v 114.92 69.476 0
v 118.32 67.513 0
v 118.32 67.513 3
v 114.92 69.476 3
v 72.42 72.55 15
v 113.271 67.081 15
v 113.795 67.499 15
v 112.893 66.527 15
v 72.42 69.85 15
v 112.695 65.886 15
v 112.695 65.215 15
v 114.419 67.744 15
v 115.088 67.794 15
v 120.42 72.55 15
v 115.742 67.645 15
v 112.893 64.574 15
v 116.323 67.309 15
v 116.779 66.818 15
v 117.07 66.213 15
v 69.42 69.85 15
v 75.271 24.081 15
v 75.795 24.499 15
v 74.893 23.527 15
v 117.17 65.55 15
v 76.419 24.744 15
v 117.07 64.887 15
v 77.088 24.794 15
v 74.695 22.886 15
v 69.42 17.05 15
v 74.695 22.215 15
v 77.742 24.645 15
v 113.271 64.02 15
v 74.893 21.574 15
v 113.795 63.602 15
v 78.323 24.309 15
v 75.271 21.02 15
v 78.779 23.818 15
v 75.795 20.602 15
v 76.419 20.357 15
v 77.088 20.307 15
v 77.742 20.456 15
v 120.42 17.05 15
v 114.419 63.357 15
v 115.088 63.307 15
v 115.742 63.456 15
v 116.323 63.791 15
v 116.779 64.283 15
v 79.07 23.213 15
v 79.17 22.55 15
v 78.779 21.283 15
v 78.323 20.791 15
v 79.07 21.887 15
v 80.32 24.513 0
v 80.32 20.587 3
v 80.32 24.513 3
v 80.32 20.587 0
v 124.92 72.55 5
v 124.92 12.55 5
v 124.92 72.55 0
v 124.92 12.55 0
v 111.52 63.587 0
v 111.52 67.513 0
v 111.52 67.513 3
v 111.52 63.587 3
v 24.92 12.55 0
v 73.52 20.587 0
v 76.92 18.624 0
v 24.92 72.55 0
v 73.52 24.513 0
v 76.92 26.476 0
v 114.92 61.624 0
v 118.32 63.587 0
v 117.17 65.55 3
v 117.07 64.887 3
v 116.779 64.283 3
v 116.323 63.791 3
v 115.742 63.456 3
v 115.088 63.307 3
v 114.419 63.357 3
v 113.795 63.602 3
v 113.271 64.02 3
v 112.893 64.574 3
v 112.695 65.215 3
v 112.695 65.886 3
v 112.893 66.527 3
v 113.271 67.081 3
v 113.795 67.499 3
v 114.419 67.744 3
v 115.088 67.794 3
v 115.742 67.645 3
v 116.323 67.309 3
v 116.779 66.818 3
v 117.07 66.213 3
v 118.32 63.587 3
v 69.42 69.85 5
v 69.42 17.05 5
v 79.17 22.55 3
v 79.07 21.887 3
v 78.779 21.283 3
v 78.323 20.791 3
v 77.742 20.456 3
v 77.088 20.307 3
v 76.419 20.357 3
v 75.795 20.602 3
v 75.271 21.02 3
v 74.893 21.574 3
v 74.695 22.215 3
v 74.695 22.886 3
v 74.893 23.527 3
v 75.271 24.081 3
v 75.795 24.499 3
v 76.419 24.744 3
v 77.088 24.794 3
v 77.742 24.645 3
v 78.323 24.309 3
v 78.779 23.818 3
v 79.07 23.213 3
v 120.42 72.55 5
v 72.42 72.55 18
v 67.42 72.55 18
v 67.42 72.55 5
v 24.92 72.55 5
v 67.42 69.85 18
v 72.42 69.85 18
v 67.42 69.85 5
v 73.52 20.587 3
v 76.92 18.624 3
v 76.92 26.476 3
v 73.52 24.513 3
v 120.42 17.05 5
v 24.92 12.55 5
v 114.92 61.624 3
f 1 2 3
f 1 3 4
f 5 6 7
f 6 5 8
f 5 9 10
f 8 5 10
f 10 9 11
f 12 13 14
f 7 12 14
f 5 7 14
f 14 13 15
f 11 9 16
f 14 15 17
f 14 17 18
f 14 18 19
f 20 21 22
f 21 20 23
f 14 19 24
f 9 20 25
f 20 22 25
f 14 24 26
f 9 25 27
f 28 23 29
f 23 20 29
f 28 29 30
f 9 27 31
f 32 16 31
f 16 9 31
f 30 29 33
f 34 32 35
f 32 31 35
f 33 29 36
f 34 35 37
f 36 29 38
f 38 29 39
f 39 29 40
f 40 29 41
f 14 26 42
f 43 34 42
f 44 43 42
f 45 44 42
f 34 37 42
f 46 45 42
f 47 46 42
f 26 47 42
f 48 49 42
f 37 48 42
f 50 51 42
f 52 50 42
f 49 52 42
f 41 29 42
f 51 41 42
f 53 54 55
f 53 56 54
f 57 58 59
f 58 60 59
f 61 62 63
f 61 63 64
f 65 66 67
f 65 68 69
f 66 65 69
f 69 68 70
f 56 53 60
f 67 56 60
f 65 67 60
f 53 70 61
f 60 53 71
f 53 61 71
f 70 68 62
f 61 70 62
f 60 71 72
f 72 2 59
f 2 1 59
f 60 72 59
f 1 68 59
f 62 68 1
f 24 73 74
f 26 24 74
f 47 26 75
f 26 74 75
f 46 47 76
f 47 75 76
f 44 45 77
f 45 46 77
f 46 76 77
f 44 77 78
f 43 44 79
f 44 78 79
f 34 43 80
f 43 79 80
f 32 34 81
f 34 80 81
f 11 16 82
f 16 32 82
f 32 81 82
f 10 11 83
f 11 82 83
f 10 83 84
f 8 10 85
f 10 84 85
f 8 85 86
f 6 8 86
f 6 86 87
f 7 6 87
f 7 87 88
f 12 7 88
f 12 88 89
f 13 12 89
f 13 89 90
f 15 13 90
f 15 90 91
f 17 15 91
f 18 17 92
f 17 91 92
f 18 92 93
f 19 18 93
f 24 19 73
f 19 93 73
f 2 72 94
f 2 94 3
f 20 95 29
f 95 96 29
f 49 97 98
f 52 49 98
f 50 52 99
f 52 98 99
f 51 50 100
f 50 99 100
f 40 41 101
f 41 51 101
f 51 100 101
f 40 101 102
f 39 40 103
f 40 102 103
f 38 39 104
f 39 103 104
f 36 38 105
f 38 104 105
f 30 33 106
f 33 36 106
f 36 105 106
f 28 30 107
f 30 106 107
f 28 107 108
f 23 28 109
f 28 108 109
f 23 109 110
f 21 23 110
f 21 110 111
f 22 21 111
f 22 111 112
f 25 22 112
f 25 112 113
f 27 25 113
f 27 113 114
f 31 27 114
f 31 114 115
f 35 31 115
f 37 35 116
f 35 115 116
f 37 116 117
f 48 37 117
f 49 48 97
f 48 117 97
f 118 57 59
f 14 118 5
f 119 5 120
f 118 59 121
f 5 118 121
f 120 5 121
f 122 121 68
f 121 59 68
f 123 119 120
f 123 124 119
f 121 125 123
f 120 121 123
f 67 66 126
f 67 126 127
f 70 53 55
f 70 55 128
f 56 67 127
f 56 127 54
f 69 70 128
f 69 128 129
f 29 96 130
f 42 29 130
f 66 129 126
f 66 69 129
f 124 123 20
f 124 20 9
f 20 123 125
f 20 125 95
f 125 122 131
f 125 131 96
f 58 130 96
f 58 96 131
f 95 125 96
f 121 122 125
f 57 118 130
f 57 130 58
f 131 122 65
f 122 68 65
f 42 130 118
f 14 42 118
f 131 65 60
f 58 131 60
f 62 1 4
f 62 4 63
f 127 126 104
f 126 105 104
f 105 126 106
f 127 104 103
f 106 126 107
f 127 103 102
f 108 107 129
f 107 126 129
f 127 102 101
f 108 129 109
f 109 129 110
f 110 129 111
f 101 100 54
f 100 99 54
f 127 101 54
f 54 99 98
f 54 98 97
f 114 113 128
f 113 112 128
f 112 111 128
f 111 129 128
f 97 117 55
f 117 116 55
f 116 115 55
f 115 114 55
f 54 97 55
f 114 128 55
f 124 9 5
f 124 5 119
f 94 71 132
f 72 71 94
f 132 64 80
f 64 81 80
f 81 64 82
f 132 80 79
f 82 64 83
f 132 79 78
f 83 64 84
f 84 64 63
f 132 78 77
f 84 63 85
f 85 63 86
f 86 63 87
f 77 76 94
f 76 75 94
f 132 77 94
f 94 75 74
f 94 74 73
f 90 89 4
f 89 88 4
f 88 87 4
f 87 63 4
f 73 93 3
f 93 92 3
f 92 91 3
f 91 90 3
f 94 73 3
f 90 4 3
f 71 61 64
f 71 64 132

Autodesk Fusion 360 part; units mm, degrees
sketch "Sketch1" plane through (0, 0, 0) normal (0, 0, 1) x (1, 0, 0)
  line L0 (124.9201, 72.5503) -> (24.9201, 72.5503)
  line L1 (24.9201, 72.5503) -> (24.9201, 12.5503)
  line L2 (24.9201, 12.5503) -> (124.9201, 12.5503)
  line L3 (124.9201, 12.5503) -> (124.9201, 72.5503)
  line L4 (124.9201, 42.5503) -> (24.9201, 42.5503) construction
  line L5 (74.9201, 72.5503) -> (74.9201, 12.5503) construction
  line L6 (120.4201, 68.0503) -> (69.4201, 68.0503)
  line L7 (69.4201, 68.0503) -> (69.4201, 17.0503)
  line L8 (69.4201, 17.0503) -> (120.4201, 17.0503)
  line L9 (120.4201, 17.0503) -> (120.4201, 68.0503)
  line L10 (120.4201, 68.0503) -> (69.4201, 17.0503) construction
  line L11 (69.4201, 68.0503) -> (120.4201, 17.0503) construction
  line L12 (114.9201, 42.5503) -> (114.9201, 68.0503) construction
  line L13 (114.9201, 65.5503) -> (69.4201, 65.5503) construction
  circle A0 centre (114.9201, 65.5503) radius 2.25
  line L14 (69.4201, 22.5503) -> (120.4201, 22.5503) construction
  line L15 (94.9201, 68.0503) -> (94.9201, 17) construction
  line L16 (76.9201, 17.0503) -> (76.9201, 42.5503) construction
  circle A1 centre (76.9201, 22.5503) radius 2.25
  line L17 (118.3201, 67.5133) -> (114.9201, 69.4763)
  line L18 (114.9201, 69.4763) -> (111.5201, 67.5133)
  line L19 (111.5201, 67.5133) -> (111.5201, 63.5873)
  line L20 (111.5201, 63.5873) -> (114.9201, 61.6243)
  line L21 (114.9201, 61.6243) -> (118.3201, 63.5873)
  line L22 (118.3201, 63.5873) -> (118.3201, 67.5133)
  line L23 (80.3201, 24.5133) -> (76.9201, 26.4763)
  line L24 (76.9201, 26.4763) -> (73.5201, 24.5133)
  line L25 (73.5201, 24.5133) -> (73.5201, 20.5873)
  line L26 (73.5201, 20.5873) -> (76.9201, 18.6243)
  line L27 (76.9201, 18.6243) -> (80.3201, 20.5873)
  line L28 (80.3201, 20.5873) -> (80.3201, 24.5133)
  line L29 (67.4201, 68.0503) -> (26.9201, 68.0503)
  line L30 (26.9201, 68.0503) -> (26.9201, 48.5503)
  line L31 (26.9201, 48.5503) -> (67.4201, 48.5503)
  line L32 (67.4201, 48.5503) -> (67.4201, 68.0503)
  line L33 (28.1201, 49.7503) -> (66.2201, 49.7503)
  line L34 (66.2201, 49.7503) -> (66.2201, 66.8503)
  line L35 (66.2201, 66.8503) -> (28.1201, 66.8503)
  line L36 (28.1201, 66.8503) -> (28.1201, 49.7503)
  line L37 (67.4201, 68.0503) -> (72.4201, 68.0503)
  line L38 (72.4201, 68.0503) -> (72.4201, 70.0503)
  line L39 (72.4201, 70.0503) -> (67.4201, 70.0503)
  line L40 (67.4201, 70.0503) -> (67.4201, 68.0503)
  point P0 (94.9201, 42.5503)
  point P1 (114.9201, 65.5503)
  point P2 (76.9201, 22.5503)
  dimension "d1" = 100
  dimension "d2" = 60
  dimension "d3" = 51
  dimension "d4" = 51
  dimension "d5" = 45.5
  dimension "d6" = 23
  dimension "d7" = 4.5
  dimension "d8" = 20
  dimension "d10" = 18
  dimension "d11" = 4.5
  dimension "d18" = 3.4
  dimension "d19" = 3.4
  dimension "d22" = 19.5
  dimension "d23" = 2
  dimension "d24" = 2
  dimension "d25" = -1.2
  dimension "d26" = 5
  dimension "d27" = 2
extrude "Extrude1" add sketch "Sketch1" along normal blind 5 contours L0 L1 L2 L3 | L29 L30 L31 L32 | L6 L37 L38 L39 L40 | L6 L17 L18 | L33 L34 L35 L36
extrude "Extrude2" add sketch "Sketch1" along normal blind 15 contours L6 L7 L8 L9 L17 L18 L19 L20 L21 L22 L37 | L6 L17 L18 L19 L20 L21 L22 | L23 L24 L25 L26 L27 L28
extrude "Extrude3" add 1 faces at (103.4201, 68.0503, 8.3333) along direction (0, 1, 0) blind 4.5
extrude "Extrude4" cut sketch "Sketch1" along normal blind 3 contours L6 L17 L18 | L6 L17 L18 L19 L20 L21 L22 | L23 L24 L25 L26 L27 L28
extrude "Extrude5" add sketch "Sketch1" along normal blind 18 contours L6 L37 L38 L39 L40
sketch "Sketch2" plane through (0, 0, 0) normal (0, 0, 1) x (1, 0, 0)
extrude "Extrude6" cut 1 faces at (69.7535, 68.0503, 17) along direction (0, 1, 0) blind 1.8
extrude "Extrude7" add 1 faces at (69.7535, 70.0503, 17) along direction (0, 1, 0) blind 2.5
